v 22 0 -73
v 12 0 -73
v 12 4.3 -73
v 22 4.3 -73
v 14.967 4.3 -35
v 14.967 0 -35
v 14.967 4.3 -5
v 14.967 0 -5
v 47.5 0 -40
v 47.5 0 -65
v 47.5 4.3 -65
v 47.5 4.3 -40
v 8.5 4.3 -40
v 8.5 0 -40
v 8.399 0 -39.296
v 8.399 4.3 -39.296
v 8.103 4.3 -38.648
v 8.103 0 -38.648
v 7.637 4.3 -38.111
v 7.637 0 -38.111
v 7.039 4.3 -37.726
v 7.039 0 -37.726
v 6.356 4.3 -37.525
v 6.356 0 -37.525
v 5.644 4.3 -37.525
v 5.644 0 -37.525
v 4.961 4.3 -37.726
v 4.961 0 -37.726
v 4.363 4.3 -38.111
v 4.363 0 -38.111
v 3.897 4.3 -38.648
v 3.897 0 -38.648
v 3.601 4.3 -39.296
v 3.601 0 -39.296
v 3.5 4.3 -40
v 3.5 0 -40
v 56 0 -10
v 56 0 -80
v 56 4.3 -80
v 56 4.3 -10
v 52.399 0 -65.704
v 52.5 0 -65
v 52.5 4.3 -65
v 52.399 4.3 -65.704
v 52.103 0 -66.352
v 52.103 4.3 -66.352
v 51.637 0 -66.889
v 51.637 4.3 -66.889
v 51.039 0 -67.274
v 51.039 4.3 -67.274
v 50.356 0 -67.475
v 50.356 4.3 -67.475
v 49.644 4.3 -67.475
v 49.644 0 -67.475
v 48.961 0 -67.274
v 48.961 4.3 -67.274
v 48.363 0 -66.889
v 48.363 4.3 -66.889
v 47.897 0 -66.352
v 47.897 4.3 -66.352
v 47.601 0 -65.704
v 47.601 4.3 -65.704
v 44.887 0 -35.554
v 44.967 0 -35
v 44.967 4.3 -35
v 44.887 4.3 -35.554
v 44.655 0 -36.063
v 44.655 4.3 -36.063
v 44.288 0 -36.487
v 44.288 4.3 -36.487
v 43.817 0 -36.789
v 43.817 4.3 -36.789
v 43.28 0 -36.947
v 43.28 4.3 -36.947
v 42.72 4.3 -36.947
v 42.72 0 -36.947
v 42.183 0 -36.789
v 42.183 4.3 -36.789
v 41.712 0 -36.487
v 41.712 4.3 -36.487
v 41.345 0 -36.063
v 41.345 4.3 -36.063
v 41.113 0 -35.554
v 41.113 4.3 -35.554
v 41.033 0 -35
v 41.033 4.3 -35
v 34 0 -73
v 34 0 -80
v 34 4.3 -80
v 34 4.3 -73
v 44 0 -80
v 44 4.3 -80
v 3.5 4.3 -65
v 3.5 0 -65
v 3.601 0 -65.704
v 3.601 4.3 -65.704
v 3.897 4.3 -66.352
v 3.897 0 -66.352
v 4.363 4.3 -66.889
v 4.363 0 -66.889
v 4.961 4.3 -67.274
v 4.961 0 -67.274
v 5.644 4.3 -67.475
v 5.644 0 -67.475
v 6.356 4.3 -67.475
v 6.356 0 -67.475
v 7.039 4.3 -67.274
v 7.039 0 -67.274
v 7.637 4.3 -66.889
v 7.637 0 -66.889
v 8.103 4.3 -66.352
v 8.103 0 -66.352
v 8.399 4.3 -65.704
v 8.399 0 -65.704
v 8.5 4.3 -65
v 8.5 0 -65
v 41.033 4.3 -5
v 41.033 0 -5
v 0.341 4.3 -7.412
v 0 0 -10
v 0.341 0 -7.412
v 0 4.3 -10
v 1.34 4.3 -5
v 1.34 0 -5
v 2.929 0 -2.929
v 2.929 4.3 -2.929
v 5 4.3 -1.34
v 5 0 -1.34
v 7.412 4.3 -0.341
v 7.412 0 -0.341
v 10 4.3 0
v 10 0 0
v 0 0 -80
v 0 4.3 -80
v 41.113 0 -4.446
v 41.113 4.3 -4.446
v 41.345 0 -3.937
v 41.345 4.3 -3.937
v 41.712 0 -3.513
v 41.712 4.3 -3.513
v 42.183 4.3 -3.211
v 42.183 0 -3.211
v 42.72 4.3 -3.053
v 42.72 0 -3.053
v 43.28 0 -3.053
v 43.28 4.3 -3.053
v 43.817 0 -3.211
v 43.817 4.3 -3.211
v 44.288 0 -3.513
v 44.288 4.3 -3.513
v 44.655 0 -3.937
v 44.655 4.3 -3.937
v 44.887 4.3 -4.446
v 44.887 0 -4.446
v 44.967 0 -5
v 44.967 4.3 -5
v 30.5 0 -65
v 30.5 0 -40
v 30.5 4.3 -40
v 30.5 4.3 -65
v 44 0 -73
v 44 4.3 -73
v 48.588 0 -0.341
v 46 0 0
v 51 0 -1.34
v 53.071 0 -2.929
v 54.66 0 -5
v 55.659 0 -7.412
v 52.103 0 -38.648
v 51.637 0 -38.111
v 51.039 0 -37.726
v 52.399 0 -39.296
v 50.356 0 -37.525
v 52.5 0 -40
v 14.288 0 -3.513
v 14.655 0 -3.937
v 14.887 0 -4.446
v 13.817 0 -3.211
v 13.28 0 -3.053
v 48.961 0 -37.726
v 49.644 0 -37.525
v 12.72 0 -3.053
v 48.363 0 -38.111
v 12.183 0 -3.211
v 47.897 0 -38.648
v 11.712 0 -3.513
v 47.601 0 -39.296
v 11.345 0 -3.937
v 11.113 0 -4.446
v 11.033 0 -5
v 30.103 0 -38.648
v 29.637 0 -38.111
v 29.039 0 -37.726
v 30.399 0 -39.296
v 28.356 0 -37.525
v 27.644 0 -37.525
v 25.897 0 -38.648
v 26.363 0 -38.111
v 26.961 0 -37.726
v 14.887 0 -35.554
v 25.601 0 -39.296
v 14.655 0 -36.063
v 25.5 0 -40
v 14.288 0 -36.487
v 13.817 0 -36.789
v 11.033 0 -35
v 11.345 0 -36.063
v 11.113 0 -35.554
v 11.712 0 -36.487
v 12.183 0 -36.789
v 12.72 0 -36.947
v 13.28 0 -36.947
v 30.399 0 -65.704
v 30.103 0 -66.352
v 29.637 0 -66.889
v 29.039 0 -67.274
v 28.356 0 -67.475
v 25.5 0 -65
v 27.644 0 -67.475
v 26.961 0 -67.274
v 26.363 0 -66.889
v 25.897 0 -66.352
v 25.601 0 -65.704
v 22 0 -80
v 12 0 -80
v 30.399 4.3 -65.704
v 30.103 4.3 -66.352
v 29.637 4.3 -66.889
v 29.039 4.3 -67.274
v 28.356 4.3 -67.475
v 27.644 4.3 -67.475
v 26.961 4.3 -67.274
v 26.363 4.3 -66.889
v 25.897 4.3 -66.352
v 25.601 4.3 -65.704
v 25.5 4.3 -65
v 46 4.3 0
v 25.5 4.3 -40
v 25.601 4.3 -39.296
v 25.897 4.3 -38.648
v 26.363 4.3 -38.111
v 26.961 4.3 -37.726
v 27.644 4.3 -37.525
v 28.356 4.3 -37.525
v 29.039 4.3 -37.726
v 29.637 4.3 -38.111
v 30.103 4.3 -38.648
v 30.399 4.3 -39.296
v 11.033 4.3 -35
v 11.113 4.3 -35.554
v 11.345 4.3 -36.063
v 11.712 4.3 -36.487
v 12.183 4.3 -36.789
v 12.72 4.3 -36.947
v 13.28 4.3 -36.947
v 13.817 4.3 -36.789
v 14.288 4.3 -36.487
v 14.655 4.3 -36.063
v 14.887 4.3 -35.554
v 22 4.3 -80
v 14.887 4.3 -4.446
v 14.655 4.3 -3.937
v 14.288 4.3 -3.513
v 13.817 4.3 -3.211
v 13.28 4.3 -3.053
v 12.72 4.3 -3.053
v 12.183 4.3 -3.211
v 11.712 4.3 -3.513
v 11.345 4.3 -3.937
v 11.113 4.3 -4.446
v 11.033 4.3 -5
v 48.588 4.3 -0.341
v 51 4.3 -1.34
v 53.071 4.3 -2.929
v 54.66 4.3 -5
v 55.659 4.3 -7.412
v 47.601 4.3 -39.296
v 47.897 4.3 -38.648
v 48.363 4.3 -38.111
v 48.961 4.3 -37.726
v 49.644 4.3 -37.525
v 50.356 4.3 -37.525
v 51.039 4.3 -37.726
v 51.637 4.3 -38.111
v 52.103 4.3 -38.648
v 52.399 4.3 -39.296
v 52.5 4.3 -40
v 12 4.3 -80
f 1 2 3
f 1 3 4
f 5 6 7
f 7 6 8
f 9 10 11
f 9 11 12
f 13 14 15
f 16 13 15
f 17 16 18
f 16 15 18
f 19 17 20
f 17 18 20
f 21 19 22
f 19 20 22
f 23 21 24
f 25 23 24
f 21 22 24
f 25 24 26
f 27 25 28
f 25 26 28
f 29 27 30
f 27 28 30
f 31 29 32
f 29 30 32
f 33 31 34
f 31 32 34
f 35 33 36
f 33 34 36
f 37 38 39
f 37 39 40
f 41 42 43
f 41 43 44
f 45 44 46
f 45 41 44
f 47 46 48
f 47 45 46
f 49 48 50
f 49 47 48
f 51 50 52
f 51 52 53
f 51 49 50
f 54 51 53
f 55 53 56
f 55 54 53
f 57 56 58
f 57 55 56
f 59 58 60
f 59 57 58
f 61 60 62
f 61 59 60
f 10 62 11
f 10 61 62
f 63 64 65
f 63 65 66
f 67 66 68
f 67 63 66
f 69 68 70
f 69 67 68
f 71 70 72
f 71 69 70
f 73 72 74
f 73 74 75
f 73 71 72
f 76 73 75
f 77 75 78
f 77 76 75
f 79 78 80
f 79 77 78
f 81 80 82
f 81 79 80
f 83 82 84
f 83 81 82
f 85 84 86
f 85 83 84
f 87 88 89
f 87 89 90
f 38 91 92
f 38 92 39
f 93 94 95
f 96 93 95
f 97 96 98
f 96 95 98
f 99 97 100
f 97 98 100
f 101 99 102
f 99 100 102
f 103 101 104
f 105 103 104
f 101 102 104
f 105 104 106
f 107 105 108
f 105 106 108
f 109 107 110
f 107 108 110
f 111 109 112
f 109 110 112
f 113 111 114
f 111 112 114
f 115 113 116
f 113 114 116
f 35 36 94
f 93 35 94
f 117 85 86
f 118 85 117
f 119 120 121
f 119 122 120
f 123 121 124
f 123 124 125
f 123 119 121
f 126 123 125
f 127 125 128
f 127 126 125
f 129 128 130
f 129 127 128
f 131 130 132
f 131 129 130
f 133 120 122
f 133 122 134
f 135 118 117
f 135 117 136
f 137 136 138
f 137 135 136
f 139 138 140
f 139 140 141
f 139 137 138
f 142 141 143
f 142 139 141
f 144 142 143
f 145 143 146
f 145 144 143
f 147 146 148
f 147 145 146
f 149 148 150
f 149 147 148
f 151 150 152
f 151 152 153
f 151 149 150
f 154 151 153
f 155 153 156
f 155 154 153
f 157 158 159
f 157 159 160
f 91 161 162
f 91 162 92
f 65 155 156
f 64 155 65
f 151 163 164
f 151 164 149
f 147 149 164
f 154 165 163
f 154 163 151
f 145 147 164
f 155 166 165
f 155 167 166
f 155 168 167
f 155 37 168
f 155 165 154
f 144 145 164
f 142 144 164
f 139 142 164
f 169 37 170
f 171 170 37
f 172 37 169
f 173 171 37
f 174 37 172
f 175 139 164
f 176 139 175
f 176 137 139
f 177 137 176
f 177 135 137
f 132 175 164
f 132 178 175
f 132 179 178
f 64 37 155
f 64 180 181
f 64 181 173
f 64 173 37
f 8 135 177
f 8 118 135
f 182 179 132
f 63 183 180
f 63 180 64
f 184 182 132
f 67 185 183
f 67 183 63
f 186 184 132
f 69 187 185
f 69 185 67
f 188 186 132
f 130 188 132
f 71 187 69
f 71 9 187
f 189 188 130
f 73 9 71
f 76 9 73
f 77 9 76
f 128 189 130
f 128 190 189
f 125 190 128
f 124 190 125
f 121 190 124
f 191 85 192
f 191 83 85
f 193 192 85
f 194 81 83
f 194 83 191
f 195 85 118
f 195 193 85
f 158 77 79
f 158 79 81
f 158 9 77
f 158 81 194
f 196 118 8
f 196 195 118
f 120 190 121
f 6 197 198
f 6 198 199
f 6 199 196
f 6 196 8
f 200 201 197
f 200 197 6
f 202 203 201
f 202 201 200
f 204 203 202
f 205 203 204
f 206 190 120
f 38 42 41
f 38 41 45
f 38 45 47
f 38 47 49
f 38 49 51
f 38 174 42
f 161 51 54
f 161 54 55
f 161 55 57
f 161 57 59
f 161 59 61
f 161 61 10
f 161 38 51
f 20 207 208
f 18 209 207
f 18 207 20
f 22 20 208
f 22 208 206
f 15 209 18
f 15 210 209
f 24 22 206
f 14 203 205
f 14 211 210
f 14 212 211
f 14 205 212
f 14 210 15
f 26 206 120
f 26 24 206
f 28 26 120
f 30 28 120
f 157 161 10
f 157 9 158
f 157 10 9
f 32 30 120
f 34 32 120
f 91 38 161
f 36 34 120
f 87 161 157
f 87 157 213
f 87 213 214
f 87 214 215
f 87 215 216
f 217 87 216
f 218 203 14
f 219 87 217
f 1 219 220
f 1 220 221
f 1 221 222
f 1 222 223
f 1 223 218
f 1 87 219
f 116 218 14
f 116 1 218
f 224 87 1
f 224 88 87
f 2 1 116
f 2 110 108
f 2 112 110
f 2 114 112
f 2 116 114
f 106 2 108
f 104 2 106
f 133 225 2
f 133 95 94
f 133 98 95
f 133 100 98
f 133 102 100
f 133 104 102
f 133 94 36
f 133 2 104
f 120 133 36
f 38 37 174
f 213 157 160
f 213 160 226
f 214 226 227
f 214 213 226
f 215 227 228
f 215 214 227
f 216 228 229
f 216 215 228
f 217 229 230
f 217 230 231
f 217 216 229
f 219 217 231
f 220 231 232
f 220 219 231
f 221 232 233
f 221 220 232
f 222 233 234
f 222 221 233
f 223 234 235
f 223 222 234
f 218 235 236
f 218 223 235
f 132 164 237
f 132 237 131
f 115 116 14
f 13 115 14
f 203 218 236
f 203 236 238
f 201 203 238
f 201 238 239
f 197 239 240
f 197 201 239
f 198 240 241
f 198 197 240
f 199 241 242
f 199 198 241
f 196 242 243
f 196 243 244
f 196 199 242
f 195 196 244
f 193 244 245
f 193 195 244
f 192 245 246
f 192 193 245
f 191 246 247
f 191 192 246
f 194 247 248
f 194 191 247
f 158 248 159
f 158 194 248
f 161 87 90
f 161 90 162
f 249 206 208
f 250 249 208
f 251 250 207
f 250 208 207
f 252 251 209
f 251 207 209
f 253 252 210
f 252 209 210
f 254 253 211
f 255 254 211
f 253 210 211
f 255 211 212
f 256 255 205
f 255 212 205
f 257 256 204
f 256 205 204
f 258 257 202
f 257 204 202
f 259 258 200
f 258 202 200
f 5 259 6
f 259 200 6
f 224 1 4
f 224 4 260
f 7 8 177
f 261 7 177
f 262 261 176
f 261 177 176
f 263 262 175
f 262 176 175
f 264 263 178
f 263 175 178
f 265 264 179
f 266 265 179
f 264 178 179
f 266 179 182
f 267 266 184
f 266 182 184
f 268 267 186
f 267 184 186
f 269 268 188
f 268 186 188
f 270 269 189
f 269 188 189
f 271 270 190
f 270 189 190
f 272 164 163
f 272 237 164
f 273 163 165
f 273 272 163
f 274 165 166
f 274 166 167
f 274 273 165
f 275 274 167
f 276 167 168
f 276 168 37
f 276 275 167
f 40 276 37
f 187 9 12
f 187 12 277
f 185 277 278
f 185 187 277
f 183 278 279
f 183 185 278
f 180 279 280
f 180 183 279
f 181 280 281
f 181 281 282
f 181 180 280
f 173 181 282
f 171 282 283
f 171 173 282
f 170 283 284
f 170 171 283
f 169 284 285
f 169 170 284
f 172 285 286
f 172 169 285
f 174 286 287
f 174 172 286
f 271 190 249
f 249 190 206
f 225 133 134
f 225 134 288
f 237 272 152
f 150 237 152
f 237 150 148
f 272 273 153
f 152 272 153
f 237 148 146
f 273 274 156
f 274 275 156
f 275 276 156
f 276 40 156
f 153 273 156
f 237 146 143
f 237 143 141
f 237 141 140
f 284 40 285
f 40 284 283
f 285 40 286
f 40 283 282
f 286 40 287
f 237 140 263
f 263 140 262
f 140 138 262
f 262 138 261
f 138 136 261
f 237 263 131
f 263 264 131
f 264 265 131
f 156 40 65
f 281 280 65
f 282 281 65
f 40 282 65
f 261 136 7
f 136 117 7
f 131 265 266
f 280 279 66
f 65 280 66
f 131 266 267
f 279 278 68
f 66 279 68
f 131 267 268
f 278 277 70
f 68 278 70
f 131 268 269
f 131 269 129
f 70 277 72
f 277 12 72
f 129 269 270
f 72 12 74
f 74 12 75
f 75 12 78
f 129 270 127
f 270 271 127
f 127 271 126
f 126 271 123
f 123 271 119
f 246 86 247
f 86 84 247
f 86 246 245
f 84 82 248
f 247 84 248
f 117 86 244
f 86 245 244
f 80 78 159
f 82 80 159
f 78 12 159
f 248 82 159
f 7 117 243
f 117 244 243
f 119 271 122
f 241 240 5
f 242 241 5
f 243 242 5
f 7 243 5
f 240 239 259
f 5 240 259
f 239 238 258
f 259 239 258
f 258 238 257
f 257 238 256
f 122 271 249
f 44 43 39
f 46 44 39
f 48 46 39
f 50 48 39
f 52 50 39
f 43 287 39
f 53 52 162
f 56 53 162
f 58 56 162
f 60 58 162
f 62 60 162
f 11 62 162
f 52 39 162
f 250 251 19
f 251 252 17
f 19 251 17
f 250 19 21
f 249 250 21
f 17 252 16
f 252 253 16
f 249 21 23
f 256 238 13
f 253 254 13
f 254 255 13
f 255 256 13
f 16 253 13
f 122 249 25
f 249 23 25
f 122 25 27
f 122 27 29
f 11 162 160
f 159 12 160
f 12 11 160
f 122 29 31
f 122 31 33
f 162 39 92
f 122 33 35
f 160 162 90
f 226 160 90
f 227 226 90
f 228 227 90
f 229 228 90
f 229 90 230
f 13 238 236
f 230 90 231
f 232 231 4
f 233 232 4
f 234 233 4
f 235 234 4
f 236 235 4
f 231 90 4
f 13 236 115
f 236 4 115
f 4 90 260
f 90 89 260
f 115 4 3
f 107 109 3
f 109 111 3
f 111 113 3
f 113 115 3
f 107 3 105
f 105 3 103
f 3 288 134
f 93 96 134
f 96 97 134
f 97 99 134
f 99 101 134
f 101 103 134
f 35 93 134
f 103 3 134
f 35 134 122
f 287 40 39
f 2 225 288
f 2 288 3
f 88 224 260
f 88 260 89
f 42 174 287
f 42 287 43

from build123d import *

# Parameters (mm, degrees)
BOSS_EXTRUDE1_DEPTH = 4.3
FILLET1_R           = 10


with BuildPart() as part:
    # Sketch1 → Boss-Extrude1 (new body)
    with BuildSketch(Plane(origin=(0, 0, 0), x_dir=(1, 0, 0), z_dir=(0, 1, 0))):
        Polygon((0, 0), (0, 80), (12, 80), (12, 73), (22, 73), (22, 80), (34, 80), (34, 73), (44, 73), (44, 80), (56, 80), (56, 0), align=None)
        with BuildLine():
            Line((14.966953147, 35), (14.966953147, 5))
            ThreePointArc((14.966953147, 5), (13, 3.033046853), (11.033046853, 5))
            Line((11.033046853, 5), (11.033046853, 35))
            ThreePointArc((11.033046853, 35), (13, 36.966953147), (14.966953147, 35))
        make_face(mode=Mode.SUBTRACT)
        with BuildLine():
            Line((8.5, 65), (8.5, 40))
            ThreePointArc((8.5, 40), (6, 37.5), (3.5, 40))
            Line((3.5, 40), (3.5, 65))
            ThreePointArc((3.5, 65), (6, 67.5), (8.5, 65))
        make_face(mode=Mode.SUBTRACT)
        with BuildLine():
            Line((41.033046853, 35), (41.033046853, 5))
            ThreePointArc((41.033046853, 5), (43, 3.033046853), (44.966953147, 5))
            Line((44.966953147, 5), (44.966953147, 35))
            ThreePointArc((44.966953147, 35), (43, 36.966953147), (41.033046853, 35))
        make_face(mode=Mode.SUBTRACT)
        with BuildLine():
            Line((25.5, 65), (25.5, 40))
            ThreePointArc((25.5, 40), (28, 37.5), (30.5, 40))
            Line((30.5, 40), (30.5, 65))
            ThreePointArc((30.5, 65), (28, 67.5), (25.5, 65))
        make_face(mode=Mode.SUBTRACT)
        with BuildLine():
            Line((47.5, 65), (47.5, 40))
            ThreePointArc((47.5, 40), (50, 37.5), (52.5, 40))
            Line((52.5, 40), (52.5, 65))
            ThreePointArc((52.5, 65), (50, 67.5), (47.5, 65))
        make_face(mode=Mode.SUBTRACT)
    extrude(amount=BOSS_EXTRUDE1_DEPTH)

    # Fillet1
    fillet1_edges = [part.edges().sort_by_distance(p)[0] for p in [
        (0, 2.15, 0),
        (56, 2.15, 0),
    ]]
    fillet(fillet1_edges, radius=FILLET1_R)


solid = part.part
